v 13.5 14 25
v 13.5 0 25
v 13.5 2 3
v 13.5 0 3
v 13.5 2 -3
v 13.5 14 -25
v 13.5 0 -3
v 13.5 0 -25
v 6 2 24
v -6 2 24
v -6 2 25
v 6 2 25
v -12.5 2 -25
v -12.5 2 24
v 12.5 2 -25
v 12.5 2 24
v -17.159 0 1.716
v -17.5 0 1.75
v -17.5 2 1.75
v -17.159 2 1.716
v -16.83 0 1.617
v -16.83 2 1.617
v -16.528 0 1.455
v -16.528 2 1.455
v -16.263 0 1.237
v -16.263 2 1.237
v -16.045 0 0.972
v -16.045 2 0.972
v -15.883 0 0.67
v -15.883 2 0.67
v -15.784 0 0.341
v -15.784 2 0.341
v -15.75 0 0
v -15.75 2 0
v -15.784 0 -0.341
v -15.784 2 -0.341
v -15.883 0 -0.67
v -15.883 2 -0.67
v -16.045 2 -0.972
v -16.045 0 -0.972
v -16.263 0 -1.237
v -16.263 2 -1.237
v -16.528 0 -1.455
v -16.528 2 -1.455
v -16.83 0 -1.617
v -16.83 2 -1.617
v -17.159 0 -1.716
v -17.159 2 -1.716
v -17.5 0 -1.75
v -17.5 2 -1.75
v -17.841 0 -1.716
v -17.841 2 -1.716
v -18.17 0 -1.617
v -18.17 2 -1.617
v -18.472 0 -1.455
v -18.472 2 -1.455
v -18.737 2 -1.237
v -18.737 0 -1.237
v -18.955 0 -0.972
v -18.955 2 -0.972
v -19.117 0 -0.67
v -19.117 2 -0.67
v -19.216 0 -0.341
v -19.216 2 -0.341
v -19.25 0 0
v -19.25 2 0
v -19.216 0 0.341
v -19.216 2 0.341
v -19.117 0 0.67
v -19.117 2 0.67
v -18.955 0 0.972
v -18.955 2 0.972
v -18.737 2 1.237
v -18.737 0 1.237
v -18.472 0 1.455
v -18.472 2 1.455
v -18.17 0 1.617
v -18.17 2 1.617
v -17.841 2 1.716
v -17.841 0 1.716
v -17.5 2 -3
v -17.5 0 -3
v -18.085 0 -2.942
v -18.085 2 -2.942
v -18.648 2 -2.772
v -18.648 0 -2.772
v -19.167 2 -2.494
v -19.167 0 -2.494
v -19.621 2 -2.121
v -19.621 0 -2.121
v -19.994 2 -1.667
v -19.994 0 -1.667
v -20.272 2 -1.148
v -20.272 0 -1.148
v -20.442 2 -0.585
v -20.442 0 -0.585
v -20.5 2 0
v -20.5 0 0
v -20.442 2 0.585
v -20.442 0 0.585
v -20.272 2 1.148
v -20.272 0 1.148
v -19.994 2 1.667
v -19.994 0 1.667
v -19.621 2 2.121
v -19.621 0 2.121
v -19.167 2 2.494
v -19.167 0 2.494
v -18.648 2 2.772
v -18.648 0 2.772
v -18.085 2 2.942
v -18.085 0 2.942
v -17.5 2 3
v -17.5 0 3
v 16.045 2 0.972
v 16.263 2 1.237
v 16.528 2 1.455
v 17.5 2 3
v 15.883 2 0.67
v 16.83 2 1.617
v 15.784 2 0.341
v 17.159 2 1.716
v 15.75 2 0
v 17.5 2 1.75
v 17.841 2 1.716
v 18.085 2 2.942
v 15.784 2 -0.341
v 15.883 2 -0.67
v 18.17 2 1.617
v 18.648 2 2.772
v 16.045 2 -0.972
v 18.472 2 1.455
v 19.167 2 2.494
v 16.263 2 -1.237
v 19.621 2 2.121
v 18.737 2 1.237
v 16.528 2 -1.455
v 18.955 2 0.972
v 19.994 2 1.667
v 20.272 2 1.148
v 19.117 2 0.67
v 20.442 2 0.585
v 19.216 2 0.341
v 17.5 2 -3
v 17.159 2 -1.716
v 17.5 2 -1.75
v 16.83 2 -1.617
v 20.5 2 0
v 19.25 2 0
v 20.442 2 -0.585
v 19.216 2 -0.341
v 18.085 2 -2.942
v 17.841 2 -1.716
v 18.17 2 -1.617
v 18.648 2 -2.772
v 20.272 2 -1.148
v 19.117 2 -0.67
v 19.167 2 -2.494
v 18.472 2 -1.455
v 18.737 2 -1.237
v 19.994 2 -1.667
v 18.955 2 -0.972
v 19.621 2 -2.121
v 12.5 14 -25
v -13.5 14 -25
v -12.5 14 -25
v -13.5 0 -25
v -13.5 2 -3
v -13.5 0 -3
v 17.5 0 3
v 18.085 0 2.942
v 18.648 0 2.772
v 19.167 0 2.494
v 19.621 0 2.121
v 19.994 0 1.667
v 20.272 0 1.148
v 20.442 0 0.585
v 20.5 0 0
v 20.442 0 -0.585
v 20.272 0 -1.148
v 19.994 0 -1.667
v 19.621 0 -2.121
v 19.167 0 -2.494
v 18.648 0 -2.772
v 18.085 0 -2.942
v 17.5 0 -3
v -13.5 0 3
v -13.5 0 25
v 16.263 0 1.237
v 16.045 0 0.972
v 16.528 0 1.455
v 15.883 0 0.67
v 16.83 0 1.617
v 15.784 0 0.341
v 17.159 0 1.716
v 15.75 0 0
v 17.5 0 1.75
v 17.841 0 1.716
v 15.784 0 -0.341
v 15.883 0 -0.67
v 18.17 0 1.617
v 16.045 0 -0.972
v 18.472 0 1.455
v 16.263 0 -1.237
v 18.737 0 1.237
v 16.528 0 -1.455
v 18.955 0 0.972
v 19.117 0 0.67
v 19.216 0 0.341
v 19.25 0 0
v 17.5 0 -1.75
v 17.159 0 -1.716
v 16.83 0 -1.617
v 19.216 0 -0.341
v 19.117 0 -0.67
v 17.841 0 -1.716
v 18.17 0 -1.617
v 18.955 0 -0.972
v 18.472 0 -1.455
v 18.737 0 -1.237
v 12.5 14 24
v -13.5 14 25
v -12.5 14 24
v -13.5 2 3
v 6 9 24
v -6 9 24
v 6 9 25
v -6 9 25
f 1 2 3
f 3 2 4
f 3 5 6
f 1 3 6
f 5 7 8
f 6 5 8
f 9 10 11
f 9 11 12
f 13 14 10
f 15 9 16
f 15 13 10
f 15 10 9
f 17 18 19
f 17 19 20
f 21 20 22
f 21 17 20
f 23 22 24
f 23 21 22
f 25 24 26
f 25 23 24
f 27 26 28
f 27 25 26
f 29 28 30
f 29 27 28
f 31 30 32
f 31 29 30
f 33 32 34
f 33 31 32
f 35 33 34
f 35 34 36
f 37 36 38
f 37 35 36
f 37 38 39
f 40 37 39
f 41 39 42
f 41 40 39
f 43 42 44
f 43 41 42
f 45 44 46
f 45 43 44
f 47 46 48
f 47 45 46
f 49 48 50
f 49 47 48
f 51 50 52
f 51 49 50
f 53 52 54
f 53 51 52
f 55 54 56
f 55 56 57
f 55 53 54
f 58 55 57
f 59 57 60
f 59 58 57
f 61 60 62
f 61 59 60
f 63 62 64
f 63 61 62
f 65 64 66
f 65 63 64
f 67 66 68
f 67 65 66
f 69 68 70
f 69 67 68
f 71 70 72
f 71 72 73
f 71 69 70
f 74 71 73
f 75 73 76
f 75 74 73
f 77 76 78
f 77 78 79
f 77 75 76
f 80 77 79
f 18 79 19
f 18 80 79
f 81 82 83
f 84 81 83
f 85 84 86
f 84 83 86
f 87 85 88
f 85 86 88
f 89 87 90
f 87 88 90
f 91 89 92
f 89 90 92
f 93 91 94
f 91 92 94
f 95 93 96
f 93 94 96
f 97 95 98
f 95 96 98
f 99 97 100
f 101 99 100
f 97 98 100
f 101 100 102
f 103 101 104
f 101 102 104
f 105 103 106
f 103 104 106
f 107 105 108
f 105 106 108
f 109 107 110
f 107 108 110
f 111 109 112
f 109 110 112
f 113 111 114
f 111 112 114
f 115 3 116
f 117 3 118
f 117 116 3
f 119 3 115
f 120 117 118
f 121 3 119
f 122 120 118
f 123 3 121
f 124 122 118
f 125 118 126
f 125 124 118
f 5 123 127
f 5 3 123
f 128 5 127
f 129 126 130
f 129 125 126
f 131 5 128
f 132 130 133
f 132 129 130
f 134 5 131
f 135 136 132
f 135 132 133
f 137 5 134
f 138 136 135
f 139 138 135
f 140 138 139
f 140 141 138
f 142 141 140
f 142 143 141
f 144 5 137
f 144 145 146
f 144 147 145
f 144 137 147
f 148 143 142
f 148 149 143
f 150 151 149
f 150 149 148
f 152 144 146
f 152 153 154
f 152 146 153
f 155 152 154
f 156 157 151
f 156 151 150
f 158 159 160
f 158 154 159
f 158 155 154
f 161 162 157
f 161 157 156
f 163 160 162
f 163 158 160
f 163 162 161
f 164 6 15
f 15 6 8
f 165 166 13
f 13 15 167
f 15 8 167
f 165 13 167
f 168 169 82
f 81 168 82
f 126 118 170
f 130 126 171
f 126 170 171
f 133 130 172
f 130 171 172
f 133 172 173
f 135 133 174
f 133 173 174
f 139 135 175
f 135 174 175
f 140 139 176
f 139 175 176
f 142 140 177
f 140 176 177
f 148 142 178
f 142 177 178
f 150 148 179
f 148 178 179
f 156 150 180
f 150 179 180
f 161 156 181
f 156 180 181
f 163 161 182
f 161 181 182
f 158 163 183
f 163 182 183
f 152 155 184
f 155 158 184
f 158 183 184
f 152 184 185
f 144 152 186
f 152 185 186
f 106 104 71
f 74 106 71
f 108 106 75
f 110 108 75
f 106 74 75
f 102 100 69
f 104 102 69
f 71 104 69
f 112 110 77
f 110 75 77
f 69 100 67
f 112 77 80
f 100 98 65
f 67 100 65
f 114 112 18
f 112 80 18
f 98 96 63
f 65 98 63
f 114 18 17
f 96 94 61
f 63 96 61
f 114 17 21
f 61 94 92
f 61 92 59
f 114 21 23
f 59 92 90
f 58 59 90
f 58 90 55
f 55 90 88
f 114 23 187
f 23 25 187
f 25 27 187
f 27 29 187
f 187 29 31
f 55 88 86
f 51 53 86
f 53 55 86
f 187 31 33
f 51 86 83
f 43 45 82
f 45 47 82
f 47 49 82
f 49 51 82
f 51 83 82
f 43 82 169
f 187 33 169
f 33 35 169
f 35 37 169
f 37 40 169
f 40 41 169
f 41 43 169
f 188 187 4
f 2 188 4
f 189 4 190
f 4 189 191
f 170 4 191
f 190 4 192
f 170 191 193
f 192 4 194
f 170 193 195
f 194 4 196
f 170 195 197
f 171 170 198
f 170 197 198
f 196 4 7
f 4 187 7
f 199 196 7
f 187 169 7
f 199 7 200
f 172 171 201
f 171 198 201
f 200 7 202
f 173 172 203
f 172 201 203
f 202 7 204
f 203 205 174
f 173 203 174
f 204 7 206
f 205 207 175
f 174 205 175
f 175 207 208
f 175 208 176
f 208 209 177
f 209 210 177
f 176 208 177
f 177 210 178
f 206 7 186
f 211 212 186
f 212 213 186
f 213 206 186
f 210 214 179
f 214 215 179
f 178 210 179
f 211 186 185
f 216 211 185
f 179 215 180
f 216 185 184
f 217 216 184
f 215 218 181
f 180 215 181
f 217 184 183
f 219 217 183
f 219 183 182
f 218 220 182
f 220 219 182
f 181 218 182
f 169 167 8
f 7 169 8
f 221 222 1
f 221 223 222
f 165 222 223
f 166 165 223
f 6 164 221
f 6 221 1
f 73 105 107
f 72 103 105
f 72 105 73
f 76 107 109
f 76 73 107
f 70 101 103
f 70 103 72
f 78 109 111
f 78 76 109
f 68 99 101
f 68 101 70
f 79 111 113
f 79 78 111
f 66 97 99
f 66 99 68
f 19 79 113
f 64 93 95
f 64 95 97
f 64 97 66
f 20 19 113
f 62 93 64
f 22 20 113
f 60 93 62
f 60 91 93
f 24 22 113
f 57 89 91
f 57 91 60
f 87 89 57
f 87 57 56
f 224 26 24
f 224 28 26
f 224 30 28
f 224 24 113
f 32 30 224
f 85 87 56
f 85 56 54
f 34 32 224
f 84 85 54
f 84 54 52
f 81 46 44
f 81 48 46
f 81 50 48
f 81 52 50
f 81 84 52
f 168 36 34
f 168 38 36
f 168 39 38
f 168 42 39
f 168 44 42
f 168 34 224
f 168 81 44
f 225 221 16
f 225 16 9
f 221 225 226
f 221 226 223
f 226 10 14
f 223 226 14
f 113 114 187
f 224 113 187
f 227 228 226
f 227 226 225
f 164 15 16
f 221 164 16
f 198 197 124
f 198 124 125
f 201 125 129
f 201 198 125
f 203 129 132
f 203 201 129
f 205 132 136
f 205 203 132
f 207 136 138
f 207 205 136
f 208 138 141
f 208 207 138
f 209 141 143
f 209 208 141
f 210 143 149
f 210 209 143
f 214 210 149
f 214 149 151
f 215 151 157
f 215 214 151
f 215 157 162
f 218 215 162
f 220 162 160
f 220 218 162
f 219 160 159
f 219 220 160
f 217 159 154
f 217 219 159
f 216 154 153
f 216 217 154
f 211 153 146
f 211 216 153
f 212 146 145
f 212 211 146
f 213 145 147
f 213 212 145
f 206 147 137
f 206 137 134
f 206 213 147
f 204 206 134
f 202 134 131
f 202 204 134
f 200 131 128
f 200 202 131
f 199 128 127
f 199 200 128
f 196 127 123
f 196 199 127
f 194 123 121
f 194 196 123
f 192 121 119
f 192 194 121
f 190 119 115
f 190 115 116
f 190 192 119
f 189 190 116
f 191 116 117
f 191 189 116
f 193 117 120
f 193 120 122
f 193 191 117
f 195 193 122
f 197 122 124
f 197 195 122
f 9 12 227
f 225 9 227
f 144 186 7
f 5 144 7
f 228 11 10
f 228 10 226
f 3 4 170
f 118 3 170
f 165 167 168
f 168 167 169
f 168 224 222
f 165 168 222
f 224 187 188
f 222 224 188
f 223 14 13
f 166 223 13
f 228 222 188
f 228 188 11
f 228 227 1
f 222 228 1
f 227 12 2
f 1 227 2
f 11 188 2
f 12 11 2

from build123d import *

# Parameters (mm, degrees)
SKETCH1_W           = 27
SKETCH1_H           = 50
SKETCH1_R           = 3
SKETCH1_R_2         = 1.75
BOSS_EXTRUDE1_DEPTH = 2
BOSS_EXTRUDE2_DEPTH = 12
SKETCH4_W           = 12
SKETCH4_H           = 7
CUT_EXTRUDE1_DEPTH  = 56.823382198


with BuildPart() as part:
    # Sketch1 → Boss-Extrude1 (new body)
    # profile 1 of 5: a face of its own
    with BuildSketch(Plane(origin=(0, 0, 0), x_dir=(1, 0, 0), z_dir=(0, 1, 0))):
        Rectangle(SKETCH1_W, SKETCH1_H)
    # profile 2 of 5: a face of its own
    with BuildSketch(Plane(origin=(0, 0, 0), x_dir=(1, 0, 0), z_dir=(0, 1, 0))):
        with BuildLine():
            Line((-17.5, -3), (-13.5, -3))
            Line((-13.5, -3), (-13.5, 3))
            Line((-13.5, 3), (-17.5, 3))
            ThreePointArc((-17.5, 3), (-15.378679656, 2.121320344), (-14.5, 0))
            ThreePointArc((-14.5, 0), (-15.378679656, -2.121320344), (-17.5, -3))
        make_face()
    # profile 3 of 5: a face of its own
    with BuildSketch(Plane(origin=(0, 0, 0), x_dir=(1, 0, 0), z_dir=(0, 1, 0))):
        with Locations((-17.5, 0)):
            Circle(SKETCH1_R)
        with Locations(Location((-17.5, 0, 0), (0, 0, 270))):
            Circle(SKETCH1_R_2, mode=Mode.SUBTRACT)
    # profile 4 of 5: a face of its own
    with BuildSketch(Plane(origin=(0, 0, 0), x_dir=(1, 0, 0), z_dir=(0, 1, 0))):
        with BuildLine():
            Line((13.5, 3), (13.5, -3))
            Line((13.5, -3), (17.5, -3))
            ThreePointArc((17.5, -3), (14.5, 0), (17.5, 3))
            Line((17.5, 3), (13.5, 3))
        make_face()
    # profile 5 of 5: a face of its own
    with BuildSketch(Plane(origin=(0, 0, 0), x_dir=(1, 0, 0), z_dir=(0, 1, 0))):
        with Locations((17.5, 0)):
            Circle(SKETCH1_R)
        with Locations(Location((17.5, 0, 0), (0, 0, 270))):
            Circle(SKETCH1_R_2, mode=Mode.SUBTRACT)
    extrude(amount=BOSS_EXTRUDE1_DEPTH)

    # Sketch2 → Boss-Extrude2 (add)
    with BuildSketch(Plane(origin=(0, 2, 0), x_dir=(1, 0, 0), z_dir=(0, 1, 0))):
        Polygon((-13.5, 25), (-13.5, -25), (13.5, -25), (13.5, 25), (12.5, 25), (12.5, -24), (-12.5, -24), (-12.5, 25), align=None)
    extrude(amount=BOSS_EXTRUDE2_DEPTH)

    # Sketch4 → Cut-Extrude1 (cut, through all)
    with BuildSketch(Plane.XY.offset(25)):
        with Locations((0, 5.5)):
            Rectangle(SKETCH4_W, SKETCH4_H)
    extrude(amount=-CUT_EXTRUDE1_DEPTH, mode=Mode.SUBTRACT)


solid = part.part
